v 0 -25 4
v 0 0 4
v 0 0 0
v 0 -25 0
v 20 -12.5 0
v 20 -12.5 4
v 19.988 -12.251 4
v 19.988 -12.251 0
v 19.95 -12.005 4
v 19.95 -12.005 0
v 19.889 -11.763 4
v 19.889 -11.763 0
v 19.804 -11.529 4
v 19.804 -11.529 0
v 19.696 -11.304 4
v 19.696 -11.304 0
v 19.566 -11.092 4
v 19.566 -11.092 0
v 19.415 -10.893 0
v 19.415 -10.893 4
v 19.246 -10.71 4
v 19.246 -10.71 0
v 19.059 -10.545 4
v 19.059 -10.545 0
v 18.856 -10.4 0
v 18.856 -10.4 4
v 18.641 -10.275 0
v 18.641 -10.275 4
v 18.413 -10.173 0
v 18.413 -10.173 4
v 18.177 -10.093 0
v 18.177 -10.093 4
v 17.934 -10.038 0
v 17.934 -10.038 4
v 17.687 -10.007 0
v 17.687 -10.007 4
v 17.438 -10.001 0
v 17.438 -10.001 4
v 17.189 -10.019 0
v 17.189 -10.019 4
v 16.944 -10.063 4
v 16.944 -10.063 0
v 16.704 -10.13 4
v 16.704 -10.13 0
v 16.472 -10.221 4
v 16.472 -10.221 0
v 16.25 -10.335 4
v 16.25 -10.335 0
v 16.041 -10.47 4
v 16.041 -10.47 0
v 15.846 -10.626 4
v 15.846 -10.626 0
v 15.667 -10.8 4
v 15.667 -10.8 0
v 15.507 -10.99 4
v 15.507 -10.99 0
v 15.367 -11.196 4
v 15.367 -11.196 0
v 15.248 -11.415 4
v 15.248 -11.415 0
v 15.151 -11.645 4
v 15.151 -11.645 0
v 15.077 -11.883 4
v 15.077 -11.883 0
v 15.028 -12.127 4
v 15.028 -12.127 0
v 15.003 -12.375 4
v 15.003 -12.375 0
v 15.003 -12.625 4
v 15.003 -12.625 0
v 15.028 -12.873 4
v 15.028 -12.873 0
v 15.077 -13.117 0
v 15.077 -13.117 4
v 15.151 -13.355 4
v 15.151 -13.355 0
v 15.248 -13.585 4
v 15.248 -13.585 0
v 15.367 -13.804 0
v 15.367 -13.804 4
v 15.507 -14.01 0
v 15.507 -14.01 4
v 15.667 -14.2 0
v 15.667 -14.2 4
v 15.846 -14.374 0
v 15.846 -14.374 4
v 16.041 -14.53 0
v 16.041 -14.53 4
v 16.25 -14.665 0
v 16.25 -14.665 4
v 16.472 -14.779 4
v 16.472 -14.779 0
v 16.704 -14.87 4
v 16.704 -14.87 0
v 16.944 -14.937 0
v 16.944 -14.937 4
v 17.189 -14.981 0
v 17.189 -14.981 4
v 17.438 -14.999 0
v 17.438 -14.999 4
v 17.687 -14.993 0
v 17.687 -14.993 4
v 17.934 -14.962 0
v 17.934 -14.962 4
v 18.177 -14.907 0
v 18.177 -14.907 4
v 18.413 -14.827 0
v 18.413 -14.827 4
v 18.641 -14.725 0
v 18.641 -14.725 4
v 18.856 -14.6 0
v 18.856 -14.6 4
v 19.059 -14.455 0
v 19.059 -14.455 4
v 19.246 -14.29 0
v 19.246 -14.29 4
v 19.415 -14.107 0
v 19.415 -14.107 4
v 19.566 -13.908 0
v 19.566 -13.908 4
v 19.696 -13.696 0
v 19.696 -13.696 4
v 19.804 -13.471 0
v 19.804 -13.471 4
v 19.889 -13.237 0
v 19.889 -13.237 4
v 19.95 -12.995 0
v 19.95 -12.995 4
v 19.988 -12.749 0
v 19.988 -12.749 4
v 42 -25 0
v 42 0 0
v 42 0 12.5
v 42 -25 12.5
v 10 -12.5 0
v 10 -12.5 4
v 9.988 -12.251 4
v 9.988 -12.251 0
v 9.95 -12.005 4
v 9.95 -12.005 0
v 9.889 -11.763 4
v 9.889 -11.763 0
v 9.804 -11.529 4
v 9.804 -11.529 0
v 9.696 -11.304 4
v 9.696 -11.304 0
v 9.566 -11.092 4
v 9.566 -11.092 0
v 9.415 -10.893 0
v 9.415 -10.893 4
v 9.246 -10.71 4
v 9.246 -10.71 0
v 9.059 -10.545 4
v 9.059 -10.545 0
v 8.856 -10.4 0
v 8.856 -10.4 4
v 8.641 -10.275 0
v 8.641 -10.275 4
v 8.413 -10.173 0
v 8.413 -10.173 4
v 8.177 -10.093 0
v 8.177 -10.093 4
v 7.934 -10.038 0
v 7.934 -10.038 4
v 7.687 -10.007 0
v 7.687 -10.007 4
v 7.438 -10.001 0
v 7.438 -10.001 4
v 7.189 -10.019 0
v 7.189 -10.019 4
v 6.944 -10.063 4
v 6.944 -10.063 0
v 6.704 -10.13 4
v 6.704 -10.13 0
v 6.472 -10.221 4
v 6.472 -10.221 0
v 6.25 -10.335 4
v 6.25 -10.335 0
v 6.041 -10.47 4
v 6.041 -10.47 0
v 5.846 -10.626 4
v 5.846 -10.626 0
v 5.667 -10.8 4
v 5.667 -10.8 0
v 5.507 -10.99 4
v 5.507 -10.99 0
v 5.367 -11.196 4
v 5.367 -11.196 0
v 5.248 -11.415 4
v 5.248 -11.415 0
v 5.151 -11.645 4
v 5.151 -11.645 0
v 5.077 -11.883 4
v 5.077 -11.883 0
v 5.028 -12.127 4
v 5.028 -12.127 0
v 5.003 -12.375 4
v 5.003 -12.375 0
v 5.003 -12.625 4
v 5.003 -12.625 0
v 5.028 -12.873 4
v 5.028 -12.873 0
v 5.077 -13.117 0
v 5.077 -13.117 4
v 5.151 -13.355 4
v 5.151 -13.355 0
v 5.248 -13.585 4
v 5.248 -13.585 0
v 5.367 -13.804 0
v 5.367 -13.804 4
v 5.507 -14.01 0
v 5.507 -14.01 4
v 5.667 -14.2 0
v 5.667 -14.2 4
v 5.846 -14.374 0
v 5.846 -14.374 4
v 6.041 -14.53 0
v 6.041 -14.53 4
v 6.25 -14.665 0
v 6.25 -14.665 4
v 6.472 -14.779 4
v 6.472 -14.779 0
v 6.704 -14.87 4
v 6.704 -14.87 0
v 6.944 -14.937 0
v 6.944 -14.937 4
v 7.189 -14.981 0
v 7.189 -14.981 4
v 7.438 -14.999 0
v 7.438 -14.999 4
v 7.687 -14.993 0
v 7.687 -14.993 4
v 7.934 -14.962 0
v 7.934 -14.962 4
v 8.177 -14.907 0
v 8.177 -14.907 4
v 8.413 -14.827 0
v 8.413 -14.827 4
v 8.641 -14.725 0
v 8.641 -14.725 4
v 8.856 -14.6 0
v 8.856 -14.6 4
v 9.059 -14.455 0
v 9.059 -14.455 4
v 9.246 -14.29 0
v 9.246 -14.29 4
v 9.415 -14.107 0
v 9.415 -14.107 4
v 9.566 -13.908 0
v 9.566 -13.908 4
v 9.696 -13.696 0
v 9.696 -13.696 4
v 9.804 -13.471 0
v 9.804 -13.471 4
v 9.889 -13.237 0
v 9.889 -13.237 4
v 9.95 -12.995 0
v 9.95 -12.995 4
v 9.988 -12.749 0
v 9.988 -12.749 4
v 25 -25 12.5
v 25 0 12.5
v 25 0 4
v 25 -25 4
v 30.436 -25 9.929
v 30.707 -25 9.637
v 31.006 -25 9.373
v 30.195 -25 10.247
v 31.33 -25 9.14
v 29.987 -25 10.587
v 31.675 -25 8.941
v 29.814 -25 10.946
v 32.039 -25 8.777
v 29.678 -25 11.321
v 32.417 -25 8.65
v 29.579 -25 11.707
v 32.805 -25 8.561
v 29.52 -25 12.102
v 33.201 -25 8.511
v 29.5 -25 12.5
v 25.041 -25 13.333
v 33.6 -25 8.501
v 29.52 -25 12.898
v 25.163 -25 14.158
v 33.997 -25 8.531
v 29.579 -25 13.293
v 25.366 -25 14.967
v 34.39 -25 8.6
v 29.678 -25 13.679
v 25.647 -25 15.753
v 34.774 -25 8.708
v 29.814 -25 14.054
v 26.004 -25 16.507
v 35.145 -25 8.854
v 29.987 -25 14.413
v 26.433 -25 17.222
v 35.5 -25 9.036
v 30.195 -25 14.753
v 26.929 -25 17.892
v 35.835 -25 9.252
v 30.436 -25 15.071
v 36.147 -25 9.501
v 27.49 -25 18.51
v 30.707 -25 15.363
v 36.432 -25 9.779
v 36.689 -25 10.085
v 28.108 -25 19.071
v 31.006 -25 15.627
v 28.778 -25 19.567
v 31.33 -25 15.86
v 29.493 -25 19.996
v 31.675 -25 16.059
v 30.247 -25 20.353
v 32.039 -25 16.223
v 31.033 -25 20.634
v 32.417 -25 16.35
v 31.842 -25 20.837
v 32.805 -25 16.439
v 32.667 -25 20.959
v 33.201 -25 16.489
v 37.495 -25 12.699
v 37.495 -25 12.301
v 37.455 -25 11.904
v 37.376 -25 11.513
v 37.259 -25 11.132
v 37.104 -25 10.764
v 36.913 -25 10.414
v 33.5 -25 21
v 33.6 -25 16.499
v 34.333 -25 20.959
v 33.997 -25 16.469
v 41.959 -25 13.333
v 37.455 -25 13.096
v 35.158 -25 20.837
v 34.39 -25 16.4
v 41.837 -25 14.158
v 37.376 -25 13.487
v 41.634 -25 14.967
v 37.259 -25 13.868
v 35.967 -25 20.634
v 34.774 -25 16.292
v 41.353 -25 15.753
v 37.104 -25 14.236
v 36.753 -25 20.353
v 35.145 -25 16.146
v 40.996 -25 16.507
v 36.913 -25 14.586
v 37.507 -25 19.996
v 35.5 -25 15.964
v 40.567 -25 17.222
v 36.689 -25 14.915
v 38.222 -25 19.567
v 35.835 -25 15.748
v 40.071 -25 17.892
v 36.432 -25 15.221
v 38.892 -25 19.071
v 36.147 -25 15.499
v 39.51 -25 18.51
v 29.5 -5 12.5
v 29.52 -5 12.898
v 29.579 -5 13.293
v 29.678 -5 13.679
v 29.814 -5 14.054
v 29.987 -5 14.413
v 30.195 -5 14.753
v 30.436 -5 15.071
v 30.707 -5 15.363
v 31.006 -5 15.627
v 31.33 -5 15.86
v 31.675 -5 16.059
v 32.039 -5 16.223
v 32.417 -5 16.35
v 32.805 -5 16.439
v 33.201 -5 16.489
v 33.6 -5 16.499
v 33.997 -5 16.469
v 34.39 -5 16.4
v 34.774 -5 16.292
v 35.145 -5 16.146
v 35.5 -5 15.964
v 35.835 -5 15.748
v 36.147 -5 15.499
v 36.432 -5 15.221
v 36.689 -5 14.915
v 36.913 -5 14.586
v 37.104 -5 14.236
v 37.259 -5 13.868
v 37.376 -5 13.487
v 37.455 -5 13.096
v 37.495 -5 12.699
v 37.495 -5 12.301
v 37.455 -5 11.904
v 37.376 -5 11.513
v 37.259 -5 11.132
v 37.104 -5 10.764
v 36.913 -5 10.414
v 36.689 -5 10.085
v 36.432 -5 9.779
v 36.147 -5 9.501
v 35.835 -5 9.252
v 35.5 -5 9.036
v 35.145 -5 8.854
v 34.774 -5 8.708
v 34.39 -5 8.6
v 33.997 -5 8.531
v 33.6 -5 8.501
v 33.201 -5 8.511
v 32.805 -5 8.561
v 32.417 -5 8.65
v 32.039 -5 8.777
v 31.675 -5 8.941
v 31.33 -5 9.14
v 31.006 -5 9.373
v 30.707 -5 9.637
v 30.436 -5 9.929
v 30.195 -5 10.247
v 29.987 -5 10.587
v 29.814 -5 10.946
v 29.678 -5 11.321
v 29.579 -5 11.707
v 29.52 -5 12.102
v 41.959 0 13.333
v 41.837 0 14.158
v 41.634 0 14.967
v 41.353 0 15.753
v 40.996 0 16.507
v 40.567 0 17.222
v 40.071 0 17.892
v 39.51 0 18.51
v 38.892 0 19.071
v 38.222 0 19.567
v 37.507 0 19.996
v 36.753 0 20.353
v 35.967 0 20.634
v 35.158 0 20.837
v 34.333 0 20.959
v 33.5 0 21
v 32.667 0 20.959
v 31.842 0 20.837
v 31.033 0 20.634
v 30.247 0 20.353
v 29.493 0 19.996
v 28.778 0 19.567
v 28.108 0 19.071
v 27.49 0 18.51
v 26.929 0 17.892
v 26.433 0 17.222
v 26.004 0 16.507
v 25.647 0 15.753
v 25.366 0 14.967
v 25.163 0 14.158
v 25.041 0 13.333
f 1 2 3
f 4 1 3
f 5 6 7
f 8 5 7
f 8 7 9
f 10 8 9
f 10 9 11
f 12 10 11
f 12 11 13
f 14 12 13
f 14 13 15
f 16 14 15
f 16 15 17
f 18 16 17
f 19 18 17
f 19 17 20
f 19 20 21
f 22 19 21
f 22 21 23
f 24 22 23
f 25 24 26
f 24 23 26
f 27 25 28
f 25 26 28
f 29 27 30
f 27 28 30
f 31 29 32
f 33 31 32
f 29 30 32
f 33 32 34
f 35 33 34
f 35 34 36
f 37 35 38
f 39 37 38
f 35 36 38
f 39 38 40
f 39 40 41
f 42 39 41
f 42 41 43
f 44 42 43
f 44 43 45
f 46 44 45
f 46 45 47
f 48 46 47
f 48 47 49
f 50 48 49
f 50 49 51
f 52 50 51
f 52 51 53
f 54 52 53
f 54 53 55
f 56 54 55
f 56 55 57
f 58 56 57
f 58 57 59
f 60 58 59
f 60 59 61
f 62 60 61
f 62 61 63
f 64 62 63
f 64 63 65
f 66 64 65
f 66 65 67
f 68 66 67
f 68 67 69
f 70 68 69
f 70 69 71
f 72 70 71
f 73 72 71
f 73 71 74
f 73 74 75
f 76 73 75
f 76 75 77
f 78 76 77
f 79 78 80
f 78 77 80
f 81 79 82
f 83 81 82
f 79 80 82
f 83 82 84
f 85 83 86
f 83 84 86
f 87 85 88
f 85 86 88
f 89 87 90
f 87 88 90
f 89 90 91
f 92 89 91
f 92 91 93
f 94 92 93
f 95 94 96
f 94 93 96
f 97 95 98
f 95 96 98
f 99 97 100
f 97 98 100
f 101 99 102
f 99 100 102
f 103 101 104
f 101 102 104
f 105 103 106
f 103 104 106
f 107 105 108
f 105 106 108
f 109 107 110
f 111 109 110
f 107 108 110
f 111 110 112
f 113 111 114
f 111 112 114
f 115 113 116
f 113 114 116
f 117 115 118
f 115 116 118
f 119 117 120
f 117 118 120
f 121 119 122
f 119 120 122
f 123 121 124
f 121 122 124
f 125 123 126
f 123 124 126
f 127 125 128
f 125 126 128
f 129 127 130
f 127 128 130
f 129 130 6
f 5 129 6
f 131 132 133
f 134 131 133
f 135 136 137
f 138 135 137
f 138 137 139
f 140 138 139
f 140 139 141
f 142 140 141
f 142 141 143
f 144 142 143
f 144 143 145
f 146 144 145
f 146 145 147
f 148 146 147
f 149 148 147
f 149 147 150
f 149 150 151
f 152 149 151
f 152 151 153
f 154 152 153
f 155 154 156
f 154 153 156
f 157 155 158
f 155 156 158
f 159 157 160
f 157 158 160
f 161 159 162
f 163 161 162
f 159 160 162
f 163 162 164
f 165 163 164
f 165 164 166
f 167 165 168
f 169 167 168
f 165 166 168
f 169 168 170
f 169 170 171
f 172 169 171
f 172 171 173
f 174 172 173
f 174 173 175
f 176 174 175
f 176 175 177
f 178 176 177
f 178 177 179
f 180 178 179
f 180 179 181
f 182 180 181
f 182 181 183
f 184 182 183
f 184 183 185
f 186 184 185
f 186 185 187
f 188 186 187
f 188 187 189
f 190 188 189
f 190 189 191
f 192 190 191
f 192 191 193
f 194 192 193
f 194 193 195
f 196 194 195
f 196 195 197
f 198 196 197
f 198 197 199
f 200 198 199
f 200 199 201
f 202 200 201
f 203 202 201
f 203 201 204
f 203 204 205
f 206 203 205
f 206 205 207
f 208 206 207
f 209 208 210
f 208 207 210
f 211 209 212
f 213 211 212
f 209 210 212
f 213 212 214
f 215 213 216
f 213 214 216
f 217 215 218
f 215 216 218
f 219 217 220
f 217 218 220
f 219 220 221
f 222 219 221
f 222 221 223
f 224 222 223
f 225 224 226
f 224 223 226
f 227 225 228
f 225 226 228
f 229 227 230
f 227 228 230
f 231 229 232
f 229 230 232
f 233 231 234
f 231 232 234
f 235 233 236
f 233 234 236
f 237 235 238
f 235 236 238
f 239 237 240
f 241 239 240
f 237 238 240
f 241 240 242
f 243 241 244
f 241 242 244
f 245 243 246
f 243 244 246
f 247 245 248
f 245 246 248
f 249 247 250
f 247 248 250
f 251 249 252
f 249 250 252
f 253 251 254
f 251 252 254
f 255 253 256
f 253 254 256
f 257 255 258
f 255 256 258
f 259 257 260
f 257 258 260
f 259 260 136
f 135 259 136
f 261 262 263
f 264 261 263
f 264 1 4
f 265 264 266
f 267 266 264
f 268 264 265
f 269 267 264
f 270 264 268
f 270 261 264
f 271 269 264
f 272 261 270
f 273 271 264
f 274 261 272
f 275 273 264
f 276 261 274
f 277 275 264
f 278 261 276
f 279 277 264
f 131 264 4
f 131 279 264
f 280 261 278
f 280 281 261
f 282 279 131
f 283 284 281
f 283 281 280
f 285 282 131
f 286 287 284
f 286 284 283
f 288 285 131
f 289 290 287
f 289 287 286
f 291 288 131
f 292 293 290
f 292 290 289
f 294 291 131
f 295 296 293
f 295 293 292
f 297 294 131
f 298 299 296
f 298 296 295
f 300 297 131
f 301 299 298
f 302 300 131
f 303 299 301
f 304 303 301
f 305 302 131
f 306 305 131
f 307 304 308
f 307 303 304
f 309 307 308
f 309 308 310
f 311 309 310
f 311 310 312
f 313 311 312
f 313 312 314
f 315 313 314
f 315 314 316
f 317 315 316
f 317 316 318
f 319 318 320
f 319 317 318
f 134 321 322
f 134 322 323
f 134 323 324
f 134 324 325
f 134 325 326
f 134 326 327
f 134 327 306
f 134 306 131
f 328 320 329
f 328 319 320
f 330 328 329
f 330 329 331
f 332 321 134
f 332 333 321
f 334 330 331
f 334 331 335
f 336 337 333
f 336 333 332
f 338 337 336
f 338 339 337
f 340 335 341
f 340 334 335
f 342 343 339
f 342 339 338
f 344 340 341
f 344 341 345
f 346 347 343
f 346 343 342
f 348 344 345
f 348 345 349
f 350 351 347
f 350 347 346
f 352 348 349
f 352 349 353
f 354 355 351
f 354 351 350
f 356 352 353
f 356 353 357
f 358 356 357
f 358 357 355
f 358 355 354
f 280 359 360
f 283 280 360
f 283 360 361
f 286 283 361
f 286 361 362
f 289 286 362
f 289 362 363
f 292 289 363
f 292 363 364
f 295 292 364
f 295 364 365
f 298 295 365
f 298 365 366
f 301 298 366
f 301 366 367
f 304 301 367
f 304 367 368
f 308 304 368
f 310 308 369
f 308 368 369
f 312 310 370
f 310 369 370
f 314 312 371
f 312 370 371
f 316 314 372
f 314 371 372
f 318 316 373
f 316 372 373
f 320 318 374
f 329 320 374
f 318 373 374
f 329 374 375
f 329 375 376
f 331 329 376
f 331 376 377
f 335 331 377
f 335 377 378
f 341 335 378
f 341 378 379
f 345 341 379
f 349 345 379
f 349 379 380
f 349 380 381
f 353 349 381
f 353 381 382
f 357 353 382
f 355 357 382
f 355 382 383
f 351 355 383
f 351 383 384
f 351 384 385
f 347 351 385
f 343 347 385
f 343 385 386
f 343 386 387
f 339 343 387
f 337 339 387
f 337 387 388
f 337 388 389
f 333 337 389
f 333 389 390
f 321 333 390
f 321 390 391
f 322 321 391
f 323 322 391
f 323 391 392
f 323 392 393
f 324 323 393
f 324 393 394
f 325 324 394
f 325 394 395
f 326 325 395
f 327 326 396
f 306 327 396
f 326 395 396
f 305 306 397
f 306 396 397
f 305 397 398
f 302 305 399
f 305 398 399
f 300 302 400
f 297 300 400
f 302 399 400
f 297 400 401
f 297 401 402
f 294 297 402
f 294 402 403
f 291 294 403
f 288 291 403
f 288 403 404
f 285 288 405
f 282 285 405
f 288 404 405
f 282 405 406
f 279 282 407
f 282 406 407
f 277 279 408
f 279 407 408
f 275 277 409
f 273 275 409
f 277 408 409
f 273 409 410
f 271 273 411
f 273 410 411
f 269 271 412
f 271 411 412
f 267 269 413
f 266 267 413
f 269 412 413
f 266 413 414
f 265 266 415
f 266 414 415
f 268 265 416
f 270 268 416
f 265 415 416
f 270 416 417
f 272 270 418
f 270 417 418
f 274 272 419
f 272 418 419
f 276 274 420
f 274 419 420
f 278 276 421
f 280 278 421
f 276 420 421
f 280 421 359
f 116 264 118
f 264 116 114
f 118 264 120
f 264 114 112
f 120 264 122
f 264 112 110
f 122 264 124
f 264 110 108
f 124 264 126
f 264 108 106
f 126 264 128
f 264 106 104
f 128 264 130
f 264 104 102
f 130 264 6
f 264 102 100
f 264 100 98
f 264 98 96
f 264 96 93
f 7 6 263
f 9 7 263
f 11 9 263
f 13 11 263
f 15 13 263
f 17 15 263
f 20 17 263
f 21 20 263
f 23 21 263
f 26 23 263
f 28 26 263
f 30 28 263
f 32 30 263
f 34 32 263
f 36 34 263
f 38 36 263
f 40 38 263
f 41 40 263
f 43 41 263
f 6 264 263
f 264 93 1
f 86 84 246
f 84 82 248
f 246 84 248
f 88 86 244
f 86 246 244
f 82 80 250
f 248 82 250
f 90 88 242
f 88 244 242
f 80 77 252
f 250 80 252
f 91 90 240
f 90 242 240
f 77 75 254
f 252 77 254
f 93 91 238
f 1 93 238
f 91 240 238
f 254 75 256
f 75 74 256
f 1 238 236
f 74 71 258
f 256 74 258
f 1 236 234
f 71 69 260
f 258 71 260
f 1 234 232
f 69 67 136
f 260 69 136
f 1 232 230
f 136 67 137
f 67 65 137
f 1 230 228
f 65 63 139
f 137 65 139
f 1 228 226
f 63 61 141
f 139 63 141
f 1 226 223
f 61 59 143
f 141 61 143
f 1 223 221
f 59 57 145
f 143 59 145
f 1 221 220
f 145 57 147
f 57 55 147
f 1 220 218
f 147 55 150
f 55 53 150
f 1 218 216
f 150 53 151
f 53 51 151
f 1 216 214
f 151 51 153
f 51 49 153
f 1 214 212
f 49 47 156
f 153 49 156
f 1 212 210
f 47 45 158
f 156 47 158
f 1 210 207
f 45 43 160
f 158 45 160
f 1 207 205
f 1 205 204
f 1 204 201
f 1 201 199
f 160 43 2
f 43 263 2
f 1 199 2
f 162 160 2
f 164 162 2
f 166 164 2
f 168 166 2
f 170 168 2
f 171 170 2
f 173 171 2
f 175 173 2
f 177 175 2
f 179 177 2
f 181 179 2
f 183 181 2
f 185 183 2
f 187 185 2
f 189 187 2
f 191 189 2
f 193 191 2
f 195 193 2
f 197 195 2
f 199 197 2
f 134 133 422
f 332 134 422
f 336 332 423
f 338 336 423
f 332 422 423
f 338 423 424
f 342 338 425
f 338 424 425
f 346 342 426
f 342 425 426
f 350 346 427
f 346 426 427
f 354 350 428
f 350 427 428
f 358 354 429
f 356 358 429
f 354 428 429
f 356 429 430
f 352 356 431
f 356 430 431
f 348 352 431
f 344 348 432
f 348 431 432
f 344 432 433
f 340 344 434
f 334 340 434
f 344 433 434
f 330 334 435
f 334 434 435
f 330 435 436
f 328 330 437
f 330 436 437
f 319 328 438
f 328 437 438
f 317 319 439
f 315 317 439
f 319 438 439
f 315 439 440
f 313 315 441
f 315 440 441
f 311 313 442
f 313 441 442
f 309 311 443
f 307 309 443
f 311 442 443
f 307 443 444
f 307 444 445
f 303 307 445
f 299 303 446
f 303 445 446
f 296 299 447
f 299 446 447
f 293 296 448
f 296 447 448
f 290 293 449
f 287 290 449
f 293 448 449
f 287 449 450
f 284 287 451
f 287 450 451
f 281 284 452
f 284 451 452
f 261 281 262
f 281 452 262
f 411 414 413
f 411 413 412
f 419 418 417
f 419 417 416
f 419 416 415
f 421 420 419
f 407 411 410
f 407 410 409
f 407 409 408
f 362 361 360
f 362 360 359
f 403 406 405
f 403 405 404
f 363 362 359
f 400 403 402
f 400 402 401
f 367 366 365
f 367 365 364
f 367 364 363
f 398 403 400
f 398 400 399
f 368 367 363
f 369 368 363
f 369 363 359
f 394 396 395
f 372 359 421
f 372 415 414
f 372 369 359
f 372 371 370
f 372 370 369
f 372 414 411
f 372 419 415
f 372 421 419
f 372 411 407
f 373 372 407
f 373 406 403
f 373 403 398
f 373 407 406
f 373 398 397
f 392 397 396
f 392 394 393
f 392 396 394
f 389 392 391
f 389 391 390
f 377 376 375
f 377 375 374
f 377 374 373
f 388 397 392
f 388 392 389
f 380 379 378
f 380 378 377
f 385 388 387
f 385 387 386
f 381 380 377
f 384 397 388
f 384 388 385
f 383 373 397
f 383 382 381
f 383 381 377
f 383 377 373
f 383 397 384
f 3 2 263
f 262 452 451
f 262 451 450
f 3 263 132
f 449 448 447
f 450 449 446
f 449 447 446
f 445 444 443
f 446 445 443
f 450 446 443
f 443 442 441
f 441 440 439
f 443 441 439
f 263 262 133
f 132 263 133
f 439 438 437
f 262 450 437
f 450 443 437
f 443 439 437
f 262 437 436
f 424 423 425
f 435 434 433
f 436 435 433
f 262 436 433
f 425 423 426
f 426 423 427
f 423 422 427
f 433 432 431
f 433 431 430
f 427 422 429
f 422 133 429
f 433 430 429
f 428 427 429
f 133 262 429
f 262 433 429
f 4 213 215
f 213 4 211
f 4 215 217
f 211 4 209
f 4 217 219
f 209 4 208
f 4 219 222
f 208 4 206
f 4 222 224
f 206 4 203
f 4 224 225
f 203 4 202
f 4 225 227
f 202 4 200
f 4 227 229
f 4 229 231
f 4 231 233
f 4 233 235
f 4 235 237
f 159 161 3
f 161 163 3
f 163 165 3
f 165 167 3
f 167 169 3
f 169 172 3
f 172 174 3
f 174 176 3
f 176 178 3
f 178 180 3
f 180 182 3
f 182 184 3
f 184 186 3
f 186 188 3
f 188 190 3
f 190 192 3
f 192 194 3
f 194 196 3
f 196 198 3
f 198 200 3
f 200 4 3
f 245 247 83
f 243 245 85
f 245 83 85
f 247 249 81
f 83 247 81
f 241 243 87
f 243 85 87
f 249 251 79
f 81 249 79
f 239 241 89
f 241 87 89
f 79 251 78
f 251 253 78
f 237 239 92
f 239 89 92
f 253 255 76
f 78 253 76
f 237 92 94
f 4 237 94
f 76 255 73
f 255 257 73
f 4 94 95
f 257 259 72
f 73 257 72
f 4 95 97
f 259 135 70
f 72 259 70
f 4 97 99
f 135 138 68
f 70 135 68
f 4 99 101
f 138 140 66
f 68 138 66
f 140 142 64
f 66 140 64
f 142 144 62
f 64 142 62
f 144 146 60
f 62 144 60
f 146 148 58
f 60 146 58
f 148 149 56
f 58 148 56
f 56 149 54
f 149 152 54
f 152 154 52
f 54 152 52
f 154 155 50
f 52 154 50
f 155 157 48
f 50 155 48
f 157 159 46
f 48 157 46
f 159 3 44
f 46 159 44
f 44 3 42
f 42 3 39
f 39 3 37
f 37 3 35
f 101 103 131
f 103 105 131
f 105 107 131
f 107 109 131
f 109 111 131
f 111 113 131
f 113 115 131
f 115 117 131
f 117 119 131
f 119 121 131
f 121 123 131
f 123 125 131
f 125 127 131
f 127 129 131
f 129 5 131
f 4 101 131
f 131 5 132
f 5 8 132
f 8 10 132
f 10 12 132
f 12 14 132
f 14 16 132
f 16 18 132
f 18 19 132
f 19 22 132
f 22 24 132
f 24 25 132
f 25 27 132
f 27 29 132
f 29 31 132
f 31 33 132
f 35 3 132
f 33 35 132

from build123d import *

# Parameters (mm, degrees)
F1_DEPTH = 25
F2_DEPTH = 5
F4_DEPTH = 25


with BuildPart() as f1:
    # F0 (on Front) → F1 (new body)
    with BuildSketch(Plane.XZ):
        Polygon((0, 4), (0, 0), (42, 0), (42, 4), (33.5, 4), (25, 4), align=None)
        with BuildLine():
            Line((25, 12.5), (25, 4))
            Line((25, 4), (33.5, 4))
            ThreePointArc((33.5, 4), (27.4895923599, 6.4895923599), (25, 12.5))
        make_face()
        with BuildLine():
            ThreePointArc((25, 12.5), (27.4895923599, 6.4895923599), (33.5, 4))
            ThreePointArc((33.5, 4), (39.5104076401, 6.4895923599), (42, 12.5))
            ThreePointArc((42, 12.5), (33.5, 21), (25, 12.5))
        make_face()
        with BuildLine():
            ThreePointArc((37.5, 12.5), (33.5, 8.5), (29.5, 12.5))
            ThreePointArc((29.5, 12.5), (33.5, 16.5), (37.5, 12.5))
        make_face(mode=Mode.SUBTRACT)
        with BuildLine():
            Line((33.5, 4), (42, 4))
            Line((42, 4), (42, 12.5))
            ThreePointArc((42, 12.5), (39.5104076401, 6.4895923599), (33.5, 4))
        make_face()
    extrude(amount=F1_DEPTH)

    # F0 (on Front) → F2 (join)
    with BuildSketch(Plane.XZ):
        with BuildLine():
            ThreePointArc((37.5, 12.5), (33.5, 16.5), (29.5, 12.5))
            ThreePointArc((29.5, 12.5), (33.5, 8.5), (37.5, 12.5))
        make_face()
    extrude(amount=F2_DEPTH)

    # F3 (on face) → F4 (cut)
    with BuildSketch(Plane.XY.offset(4)):
        with BuildLine():
            ThreePointArc((5, -12.5), (7.5, -15), (10, -12.5))
            Line((10, -12.5), (5, -12.5))
        make_face()
        with BuildLine():
            Line((5, -12.5), (10, -12.5))
            ThreePointArc((10, -12.5), (7.5, -10), (5, -12.5))
        make_face()
        with BuildLine():
            ThreePointArc((15, -12.5), (17.5, -15), (20, -12.5))
            Line((20, -12.5), (15, -12.5))
        make_face()
        with BuildLine():
            Line((15, -12.5), (20, -12.5))
            ThreePointArc((20, -12.5), (17.5, -10), (15, -12.5))
        make_face()
    extrude(amount=-F4_DEPTH, mode=Mode.SUBTRACT)


solid = f1.part
